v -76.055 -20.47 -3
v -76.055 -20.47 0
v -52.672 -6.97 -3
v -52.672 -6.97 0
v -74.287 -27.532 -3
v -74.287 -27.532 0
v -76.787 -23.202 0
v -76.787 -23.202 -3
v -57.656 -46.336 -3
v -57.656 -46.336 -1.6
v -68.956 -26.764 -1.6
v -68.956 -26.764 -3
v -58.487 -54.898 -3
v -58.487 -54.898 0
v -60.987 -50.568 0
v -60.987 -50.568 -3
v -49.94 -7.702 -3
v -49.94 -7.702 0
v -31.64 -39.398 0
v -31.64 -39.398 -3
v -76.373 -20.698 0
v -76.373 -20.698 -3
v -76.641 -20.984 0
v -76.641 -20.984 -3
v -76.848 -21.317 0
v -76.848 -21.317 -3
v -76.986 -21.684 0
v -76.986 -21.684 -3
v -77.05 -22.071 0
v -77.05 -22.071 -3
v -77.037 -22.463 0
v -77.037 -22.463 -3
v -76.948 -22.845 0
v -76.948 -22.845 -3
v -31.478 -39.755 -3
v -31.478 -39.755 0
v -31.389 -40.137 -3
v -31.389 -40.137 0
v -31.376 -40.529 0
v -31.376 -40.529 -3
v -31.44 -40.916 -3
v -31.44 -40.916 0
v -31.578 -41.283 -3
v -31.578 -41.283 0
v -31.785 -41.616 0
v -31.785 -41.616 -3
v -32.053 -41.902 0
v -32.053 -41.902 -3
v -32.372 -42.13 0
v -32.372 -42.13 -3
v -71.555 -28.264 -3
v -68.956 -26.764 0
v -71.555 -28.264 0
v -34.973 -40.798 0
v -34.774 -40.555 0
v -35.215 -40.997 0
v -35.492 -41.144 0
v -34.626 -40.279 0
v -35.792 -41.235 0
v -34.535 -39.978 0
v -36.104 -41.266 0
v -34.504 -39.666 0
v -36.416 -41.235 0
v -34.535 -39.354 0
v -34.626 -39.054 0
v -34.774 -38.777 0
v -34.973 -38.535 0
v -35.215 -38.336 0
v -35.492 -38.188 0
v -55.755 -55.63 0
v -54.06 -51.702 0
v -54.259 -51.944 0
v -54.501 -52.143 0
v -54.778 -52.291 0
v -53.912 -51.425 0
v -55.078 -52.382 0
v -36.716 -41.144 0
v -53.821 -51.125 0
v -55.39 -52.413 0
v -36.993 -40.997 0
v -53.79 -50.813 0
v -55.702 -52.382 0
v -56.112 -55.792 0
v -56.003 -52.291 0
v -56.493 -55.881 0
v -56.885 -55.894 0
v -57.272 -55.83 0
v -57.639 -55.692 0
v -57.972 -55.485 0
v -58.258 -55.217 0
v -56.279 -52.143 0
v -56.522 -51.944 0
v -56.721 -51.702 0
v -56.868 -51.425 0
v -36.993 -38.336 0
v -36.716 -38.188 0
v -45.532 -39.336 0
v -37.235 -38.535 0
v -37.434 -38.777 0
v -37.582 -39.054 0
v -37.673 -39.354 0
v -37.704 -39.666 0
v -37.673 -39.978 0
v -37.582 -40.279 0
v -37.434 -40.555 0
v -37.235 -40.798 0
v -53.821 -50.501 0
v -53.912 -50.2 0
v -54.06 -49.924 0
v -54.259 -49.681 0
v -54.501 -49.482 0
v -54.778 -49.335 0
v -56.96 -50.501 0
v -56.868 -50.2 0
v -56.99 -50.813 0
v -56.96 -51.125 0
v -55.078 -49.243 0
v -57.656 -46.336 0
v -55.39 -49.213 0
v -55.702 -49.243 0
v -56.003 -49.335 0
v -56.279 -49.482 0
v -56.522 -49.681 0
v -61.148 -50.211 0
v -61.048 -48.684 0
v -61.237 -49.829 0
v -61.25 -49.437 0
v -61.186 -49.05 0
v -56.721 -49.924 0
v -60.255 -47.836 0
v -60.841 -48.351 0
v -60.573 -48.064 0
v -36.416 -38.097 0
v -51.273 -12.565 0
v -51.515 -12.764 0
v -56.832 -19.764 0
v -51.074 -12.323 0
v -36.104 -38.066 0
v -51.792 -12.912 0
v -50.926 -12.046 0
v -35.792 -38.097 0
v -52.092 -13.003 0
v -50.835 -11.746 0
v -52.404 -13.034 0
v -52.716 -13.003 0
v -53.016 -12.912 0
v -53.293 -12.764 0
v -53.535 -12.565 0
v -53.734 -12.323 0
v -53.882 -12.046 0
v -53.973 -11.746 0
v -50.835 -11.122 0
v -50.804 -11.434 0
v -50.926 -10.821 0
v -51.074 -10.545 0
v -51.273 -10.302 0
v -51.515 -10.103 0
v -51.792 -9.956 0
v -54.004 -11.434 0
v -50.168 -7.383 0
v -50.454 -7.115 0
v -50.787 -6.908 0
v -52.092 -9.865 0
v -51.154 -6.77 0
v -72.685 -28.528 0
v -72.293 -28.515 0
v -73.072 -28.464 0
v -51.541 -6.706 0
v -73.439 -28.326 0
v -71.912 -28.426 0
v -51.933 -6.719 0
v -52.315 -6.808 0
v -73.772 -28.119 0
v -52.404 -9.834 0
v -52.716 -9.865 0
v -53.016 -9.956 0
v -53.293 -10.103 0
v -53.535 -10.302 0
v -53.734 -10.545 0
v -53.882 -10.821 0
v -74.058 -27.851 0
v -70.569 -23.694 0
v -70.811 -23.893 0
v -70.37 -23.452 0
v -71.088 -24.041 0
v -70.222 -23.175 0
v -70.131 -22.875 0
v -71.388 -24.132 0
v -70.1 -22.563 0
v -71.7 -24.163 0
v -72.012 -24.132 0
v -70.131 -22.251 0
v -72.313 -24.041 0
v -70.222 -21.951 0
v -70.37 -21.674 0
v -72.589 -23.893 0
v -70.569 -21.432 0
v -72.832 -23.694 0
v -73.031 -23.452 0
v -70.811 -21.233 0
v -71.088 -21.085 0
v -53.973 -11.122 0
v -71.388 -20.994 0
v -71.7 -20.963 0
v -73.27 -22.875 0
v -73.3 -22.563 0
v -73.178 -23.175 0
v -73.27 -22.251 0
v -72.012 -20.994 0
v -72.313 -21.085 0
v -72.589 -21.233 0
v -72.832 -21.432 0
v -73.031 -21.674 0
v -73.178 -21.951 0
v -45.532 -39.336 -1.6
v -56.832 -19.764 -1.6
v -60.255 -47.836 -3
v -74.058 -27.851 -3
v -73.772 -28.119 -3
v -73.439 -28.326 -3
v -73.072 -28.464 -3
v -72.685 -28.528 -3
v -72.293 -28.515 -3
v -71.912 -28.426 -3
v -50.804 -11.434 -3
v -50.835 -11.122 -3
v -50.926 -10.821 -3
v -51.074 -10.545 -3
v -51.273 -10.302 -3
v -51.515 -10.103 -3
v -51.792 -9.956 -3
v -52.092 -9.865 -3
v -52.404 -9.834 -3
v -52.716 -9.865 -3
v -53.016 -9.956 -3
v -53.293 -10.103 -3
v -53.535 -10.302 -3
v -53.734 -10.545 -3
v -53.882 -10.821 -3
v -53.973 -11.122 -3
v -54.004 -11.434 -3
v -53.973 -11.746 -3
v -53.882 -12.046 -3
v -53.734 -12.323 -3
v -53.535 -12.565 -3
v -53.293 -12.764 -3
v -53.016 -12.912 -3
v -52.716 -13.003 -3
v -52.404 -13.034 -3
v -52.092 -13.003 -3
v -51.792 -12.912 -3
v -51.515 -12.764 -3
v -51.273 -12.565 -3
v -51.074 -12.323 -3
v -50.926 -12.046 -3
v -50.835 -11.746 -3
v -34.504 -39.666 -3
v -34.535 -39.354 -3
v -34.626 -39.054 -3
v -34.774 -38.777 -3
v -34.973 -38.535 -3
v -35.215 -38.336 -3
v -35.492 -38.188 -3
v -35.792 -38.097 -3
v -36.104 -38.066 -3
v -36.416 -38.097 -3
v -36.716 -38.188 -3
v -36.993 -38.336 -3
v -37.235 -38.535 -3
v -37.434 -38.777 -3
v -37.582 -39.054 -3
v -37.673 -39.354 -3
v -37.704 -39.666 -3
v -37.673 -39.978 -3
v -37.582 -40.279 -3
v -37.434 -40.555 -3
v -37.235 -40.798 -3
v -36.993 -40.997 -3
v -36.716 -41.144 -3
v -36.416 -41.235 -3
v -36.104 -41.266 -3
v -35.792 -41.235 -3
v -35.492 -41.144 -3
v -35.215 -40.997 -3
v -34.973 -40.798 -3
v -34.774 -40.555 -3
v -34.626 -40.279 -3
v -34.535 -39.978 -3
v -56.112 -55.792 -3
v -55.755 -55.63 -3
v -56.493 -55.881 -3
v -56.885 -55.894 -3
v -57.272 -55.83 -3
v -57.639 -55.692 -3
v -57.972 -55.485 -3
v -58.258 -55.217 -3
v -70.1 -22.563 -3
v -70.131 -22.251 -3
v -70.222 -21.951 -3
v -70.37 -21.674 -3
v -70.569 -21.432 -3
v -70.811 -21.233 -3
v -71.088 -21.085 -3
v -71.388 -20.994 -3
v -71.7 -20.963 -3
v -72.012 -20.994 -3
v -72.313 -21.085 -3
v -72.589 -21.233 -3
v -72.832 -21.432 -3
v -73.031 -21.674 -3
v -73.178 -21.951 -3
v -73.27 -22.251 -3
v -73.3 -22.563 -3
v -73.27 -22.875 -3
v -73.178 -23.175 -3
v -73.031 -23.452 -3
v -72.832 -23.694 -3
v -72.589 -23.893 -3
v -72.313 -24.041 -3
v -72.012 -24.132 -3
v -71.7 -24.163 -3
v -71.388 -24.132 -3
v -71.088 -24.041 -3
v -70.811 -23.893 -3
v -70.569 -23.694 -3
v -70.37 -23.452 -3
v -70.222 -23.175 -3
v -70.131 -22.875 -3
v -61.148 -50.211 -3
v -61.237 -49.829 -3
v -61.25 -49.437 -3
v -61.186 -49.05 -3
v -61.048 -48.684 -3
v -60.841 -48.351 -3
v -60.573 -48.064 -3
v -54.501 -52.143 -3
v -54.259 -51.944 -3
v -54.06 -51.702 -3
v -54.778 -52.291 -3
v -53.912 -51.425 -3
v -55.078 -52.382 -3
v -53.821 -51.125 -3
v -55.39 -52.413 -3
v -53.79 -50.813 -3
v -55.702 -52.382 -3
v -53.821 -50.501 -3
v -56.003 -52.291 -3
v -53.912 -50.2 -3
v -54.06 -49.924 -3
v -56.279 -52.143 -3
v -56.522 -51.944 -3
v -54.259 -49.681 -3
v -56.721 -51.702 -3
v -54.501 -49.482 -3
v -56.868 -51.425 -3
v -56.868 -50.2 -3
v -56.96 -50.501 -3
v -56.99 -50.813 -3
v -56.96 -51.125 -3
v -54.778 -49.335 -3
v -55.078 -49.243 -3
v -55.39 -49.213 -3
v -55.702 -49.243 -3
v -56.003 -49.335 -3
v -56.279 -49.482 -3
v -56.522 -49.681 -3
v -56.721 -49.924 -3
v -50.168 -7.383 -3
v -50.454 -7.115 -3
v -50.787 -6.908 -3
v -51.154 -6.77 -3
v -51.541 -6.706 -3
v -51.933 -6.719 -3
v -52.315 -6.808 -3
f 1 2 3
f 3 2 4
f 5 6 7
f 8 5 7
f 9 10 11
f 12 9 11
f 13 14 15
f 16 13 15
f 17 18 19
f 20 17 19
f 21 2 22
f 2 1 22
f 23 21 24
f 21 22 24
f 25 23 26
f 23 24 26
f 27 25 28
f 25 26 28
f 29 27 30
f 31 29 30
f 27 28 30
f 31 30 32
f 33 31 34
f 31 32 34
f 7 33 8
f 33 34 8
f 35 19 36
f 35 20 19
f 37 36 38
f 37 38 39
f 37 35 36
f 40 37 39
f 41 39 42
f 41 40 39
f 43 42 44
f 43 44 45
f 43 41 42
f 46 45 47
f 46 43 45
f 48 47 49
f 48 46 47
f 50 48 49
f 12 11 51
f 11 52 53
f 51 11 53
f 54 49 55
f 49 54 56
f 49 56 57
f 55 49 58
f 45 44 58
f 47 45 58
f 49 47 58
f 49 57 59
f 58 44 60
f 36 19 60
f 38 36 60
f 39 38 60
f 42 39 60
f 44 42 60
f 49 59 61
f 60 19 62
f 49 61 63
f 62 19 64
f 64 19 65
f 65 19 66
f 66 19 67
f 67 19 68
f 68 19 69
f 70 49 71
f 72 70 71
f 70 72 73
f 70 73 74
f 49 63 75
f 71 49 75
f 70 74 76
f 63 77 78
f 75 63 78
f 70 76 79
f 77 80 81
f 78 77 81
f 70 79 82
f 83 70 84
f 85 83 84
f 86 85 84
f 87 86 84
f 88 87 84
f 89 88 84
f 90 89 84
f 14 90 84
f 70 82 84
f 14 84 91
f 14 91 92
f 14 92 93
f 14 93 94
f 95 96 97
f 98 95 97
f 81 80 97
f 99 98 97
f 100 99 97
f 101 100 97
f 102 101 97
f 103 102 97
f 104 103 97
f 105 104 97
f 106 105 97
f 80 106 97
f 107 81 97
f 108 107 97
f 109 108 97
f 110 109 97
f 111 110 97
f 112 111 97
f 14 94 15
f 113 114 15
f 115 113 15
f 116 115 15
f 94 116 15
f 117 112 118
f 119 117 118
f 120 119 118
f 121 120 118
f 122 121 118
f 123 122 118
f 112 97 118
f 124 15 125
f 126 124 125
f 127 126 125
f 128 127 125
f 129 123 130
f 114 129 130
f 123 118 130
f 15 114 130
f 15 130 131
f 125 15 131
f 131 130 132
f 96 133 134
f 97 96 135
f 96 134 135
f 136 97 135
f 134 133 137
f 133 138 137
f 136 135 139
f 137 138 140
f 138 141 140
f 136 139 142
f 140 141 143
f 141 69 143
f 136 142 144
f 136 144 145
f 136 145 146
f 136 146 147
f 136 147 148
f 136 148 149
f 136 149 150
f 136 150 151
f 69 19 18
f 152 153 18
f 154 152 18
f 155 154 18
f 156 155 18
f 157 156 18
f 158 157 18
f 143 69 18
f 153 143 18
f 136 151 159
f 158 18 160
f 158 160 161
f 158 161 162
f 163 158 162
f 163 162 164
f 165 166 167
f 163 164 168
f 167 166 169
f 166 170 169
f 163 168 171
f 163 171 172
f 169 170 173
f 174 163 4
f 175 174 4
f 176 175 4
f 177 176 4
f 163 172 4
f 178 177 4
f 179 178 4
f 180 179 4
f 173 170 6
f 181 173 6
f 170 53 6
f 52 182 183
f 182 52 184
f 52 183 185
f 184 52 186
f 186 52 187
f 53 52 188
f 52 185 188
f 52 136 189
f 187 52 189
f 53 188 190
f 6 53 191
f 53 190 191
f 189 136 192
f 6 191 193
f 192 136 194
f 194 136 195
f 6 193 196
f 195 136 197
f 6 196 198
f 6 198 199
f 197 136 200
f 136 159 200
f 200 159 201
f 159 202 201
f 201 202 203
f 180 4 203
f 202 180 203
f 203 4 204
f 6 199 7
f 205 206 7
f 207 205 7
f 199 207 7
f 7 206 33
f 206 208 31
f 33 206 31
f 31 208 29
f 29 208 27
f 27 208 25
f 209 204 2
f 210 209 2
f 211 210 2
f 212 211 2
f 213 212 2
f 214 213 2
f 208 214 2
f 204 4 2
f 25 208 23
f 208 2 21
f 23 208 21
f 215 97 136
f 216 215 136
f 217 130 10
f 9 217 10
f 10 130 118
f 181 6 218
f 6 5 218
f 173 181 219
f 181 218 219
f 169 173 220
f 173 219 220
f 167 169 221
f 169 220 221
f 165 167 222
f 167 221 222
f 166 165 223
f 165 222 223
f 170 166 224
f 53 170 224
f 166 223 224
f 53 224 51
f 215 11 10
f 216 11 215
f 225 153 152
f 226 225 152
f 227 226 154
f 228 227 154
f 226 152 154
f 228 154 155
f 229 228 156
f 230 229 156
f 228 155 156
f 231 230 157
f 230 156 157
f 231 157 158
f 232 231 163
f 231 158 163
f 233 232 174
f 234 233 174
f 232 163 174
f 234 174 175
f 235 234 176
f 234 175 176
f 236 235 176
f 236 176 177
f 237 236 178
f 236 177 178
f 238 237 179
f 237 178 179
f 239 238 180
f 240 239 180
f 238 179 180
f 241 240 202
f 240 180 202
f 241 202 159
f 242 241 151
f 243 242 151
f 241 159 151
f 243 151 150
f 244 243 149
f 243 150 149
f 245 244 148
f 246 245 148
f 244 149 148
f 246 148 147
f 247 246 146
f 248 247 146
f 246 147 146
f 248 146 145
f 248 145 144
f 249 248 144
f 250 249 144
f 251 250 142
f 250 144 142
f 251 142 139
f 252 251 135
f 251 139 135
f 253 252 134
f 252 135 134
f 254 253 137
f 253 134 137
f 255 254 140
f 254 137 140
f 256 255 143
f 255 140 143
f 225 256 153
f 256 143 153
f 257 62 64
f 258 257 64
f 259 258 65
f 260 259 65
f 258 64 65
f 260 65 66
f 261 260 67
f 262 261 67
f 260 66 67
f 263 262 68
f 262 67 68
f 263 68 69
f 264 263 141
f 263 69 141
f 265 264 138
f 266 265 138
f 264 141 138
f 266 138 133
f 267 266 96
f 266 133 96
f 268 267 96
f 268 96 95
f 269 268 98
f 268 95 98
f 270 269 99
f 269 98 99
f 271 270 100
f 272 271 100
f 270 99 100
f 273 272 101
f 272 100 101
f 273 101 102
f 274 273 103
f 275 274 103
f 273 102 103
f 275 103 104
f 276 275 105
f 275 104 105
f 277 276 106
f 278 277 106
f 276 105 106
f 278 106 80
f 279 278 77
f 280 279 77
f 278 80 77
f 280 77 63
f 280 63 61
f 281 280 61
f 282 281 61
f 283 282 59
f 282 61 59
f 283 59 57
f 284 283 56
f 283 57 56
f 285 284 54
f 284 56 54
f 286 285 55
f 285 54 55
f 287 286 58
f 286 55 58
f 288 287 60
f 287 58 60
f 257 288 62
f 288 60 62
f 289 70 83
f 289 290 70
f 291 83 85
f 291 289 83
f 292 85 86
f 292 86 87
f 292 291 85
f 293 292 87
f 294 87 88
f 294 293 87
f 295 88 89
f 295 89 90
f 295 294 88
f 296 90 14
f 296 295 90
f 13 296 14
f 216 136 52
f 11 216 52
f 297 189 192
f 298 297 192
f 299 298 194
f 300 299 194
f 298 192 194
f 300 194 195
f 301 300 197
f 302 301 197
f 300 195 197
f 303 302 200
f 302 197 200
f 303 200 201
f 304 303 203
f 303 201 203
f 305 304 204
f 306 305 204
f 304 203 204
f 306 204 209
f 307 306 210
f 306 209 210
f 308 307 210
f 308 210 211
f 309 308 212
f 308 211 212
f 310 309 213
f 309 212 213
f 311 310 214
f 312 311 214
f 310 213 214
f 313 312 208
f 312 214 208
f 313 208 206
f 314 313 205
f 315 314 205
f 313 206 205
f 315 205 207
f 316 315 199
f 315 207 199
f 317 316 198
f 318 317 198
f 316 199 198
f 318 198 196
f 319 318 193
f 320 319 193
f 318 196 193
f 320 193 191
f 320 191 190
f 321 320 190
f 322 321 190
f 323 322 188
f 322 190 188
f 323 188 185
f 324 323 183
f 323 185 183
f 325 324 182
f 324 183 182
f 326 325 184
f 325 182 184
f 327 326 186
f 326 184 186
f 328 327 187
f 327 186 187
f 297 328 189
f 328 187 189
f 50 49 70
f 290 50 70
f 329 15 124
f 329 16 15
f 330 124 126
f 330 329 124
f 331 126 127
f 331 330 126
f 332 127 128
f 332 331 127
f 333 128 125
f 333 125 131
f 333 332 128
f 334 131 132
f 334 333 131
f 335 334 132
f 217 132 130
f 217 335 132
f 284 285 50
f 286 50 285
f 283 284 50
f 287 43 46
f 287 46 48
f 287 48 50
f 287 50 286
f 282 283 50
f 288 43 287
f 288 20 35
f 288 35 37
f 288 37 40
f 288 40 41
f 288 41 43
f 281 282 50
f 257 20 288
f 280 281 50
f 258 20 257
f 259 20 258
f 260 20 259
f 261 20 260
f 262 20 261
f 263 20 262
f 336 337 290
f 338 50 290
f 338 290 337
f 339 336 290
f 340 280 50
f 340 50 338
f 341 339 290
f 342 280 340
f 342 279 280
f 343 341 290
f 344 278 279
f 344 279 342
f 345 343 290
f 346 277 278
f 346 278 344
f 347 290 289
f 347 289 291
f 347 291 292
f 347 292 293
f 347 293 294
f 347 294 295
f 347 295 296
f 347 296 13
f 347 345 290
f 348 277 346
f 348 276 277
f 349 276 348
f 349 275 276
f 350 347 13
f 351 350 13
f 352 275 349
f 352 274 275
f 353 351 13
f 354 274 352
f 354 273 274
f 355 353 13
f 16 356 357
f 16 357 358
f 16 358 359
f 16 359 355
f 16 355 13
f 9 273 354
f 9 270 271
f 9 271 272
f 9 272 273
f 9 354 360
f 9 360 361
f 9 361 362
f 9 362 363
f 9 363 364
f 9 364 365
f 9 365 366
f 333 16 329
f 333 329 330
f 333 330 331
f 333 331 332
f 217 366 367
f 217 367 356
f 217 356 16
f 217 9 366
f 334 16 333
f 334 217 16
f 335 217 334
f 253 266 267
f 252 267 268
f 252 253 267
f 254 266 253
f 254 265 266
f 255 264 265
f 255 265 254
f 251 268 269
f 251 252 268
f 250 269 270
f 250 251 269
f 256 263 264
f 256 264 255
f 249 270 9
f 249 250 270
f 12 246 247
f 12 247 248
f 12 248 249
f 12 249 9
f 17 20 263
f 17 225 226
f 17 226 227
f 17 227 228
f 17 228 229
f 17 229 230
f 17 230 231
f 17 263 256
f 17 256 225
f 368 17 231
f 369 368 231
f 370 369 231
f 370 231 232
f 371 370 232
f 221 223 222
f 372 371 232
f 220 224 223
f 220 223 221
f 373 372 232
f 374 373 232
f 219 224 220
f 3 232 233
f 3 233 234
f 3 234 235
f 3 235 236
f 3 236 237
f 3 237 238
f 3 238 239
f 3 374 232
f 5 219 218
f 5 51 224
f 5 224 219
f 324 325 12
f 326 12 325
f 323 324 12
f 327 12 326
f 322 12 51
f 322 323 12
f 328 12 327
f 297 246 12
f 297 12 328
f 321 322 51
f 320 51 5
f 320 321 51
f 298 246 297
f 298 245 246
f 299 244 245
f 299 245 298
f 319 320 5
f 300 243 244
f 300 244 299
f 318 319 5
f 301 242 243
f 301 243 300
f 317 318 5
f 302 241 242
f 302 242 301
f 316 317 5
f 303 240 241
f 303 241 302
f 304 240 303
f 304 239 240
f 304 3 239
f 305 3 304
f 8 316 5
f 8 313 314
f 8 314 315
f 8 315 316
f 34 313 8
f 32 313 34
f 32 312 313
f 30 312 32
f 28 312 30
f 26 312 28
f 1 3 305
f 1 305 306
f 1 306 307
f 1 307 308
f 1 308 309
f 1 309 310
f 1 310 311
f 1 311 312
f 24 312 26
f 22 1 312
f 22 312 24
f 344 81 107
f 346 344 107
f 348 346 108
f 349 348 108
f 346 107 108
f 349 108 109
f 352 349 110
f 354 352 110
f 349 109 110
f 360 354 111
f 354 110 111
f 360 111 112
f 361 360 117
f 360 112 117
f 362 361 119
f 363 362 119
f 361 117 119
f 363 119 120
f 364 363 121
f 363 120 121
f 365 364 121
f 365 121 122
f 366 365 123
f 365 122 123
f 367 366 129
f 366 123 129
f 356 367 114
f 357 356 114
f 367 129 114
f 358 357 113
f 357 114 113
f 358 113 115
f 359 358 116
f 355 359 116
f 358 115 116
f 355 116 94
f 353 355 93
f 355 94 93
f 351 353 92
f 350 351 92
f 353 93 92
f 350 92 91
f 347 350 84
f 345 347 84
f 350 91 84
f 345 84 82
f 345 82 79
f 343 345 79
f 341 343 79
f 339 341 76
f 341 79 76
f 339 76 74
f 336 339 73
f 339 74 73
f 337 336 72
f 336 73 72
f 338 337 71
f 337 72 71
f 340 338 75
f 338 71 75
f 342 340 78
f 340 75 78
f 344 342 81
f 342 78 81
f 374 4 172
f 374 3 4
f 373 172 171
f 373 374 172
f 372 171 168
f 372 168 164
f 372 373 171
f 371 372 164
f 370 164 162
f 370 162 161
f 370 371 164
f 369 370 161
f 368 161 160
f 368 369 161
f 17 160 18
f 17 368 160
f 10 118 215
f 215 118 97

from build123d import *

# Parameters (mm, degrees)
SKETCH2_R           = 1.6
BOSS_EXTRUDE1_DEPTH = 3
FILLET1_R           = 2
CUT_EXTRUDE1_DEPTH  = 1.6


with BuildPart() as part:
    # Sketch2 → Boss-Extrude1 (new body)
    with BuildSketch(Plane.XY):
        Polygon((-77.786584036, -21.469684303), (-50.939796518, -5.969684303), (-30.639796518, -41.130315697), (-57.486584036, -56.630315697), (-61.986584036, -48.836087063), (-57.656457017, -46.336087063), (-68.956457017, -26.763912937), (-73.286584036, -29.263912937), align=None)
        with Locations((-52.403898133, -11.433785918)):
            Circle(SKETCH2_R, mode=Mode.SUBTRACT)
        with Locations((-36.103898133, -39.666214082)):
            Circle(SKETCH2_R, mode=Mode.SUBTRACT)
        with Locations((-55.390275833, -50.812719363)):
            Circle(SKETCH2_R, mode=Mode.SUBTRACT)
        with Locations((-71.70024372, -22.563026312)):
            Circle(SKETCH2_R, mode=Mode.SUBTRACT)
    extrude(amount=-BOSS_EXTRUDE1_DEPTH)

    # Fillet1
    fillet1_edges = [part.edges().sort_by_distance(p)[0] for p in [
        (-77.786584036, -21.469684303, -1.5),
        (-50.939796518, -5.969684303, -1.5),
        (-30.639796518, -41.130315697, -1.5),
        (-57.486584036, -56.630315697, -1.5),
        (-61.986584036, -48.836087063, -1.5),
        (-73.286584036, -29.263912937, -1.5),
    ]]
    fillet(fillet1_edges, radius=FILLET1_R)

    # Sketch3 → Cut-Extrude1 (cut)
    with BuildSketch(Plane.XY):
        Polygon((-68.956457017, -26.763912937), (-57.656457017, -46.336087063), (-45.532101364, -39.336087063), (-56.832101364, -19.763912937), align=None)
    extrude(amount=-CUT_EXTRUDE1_DEPTH, mode=Mode.SUBTRACT)


solid = part.part
